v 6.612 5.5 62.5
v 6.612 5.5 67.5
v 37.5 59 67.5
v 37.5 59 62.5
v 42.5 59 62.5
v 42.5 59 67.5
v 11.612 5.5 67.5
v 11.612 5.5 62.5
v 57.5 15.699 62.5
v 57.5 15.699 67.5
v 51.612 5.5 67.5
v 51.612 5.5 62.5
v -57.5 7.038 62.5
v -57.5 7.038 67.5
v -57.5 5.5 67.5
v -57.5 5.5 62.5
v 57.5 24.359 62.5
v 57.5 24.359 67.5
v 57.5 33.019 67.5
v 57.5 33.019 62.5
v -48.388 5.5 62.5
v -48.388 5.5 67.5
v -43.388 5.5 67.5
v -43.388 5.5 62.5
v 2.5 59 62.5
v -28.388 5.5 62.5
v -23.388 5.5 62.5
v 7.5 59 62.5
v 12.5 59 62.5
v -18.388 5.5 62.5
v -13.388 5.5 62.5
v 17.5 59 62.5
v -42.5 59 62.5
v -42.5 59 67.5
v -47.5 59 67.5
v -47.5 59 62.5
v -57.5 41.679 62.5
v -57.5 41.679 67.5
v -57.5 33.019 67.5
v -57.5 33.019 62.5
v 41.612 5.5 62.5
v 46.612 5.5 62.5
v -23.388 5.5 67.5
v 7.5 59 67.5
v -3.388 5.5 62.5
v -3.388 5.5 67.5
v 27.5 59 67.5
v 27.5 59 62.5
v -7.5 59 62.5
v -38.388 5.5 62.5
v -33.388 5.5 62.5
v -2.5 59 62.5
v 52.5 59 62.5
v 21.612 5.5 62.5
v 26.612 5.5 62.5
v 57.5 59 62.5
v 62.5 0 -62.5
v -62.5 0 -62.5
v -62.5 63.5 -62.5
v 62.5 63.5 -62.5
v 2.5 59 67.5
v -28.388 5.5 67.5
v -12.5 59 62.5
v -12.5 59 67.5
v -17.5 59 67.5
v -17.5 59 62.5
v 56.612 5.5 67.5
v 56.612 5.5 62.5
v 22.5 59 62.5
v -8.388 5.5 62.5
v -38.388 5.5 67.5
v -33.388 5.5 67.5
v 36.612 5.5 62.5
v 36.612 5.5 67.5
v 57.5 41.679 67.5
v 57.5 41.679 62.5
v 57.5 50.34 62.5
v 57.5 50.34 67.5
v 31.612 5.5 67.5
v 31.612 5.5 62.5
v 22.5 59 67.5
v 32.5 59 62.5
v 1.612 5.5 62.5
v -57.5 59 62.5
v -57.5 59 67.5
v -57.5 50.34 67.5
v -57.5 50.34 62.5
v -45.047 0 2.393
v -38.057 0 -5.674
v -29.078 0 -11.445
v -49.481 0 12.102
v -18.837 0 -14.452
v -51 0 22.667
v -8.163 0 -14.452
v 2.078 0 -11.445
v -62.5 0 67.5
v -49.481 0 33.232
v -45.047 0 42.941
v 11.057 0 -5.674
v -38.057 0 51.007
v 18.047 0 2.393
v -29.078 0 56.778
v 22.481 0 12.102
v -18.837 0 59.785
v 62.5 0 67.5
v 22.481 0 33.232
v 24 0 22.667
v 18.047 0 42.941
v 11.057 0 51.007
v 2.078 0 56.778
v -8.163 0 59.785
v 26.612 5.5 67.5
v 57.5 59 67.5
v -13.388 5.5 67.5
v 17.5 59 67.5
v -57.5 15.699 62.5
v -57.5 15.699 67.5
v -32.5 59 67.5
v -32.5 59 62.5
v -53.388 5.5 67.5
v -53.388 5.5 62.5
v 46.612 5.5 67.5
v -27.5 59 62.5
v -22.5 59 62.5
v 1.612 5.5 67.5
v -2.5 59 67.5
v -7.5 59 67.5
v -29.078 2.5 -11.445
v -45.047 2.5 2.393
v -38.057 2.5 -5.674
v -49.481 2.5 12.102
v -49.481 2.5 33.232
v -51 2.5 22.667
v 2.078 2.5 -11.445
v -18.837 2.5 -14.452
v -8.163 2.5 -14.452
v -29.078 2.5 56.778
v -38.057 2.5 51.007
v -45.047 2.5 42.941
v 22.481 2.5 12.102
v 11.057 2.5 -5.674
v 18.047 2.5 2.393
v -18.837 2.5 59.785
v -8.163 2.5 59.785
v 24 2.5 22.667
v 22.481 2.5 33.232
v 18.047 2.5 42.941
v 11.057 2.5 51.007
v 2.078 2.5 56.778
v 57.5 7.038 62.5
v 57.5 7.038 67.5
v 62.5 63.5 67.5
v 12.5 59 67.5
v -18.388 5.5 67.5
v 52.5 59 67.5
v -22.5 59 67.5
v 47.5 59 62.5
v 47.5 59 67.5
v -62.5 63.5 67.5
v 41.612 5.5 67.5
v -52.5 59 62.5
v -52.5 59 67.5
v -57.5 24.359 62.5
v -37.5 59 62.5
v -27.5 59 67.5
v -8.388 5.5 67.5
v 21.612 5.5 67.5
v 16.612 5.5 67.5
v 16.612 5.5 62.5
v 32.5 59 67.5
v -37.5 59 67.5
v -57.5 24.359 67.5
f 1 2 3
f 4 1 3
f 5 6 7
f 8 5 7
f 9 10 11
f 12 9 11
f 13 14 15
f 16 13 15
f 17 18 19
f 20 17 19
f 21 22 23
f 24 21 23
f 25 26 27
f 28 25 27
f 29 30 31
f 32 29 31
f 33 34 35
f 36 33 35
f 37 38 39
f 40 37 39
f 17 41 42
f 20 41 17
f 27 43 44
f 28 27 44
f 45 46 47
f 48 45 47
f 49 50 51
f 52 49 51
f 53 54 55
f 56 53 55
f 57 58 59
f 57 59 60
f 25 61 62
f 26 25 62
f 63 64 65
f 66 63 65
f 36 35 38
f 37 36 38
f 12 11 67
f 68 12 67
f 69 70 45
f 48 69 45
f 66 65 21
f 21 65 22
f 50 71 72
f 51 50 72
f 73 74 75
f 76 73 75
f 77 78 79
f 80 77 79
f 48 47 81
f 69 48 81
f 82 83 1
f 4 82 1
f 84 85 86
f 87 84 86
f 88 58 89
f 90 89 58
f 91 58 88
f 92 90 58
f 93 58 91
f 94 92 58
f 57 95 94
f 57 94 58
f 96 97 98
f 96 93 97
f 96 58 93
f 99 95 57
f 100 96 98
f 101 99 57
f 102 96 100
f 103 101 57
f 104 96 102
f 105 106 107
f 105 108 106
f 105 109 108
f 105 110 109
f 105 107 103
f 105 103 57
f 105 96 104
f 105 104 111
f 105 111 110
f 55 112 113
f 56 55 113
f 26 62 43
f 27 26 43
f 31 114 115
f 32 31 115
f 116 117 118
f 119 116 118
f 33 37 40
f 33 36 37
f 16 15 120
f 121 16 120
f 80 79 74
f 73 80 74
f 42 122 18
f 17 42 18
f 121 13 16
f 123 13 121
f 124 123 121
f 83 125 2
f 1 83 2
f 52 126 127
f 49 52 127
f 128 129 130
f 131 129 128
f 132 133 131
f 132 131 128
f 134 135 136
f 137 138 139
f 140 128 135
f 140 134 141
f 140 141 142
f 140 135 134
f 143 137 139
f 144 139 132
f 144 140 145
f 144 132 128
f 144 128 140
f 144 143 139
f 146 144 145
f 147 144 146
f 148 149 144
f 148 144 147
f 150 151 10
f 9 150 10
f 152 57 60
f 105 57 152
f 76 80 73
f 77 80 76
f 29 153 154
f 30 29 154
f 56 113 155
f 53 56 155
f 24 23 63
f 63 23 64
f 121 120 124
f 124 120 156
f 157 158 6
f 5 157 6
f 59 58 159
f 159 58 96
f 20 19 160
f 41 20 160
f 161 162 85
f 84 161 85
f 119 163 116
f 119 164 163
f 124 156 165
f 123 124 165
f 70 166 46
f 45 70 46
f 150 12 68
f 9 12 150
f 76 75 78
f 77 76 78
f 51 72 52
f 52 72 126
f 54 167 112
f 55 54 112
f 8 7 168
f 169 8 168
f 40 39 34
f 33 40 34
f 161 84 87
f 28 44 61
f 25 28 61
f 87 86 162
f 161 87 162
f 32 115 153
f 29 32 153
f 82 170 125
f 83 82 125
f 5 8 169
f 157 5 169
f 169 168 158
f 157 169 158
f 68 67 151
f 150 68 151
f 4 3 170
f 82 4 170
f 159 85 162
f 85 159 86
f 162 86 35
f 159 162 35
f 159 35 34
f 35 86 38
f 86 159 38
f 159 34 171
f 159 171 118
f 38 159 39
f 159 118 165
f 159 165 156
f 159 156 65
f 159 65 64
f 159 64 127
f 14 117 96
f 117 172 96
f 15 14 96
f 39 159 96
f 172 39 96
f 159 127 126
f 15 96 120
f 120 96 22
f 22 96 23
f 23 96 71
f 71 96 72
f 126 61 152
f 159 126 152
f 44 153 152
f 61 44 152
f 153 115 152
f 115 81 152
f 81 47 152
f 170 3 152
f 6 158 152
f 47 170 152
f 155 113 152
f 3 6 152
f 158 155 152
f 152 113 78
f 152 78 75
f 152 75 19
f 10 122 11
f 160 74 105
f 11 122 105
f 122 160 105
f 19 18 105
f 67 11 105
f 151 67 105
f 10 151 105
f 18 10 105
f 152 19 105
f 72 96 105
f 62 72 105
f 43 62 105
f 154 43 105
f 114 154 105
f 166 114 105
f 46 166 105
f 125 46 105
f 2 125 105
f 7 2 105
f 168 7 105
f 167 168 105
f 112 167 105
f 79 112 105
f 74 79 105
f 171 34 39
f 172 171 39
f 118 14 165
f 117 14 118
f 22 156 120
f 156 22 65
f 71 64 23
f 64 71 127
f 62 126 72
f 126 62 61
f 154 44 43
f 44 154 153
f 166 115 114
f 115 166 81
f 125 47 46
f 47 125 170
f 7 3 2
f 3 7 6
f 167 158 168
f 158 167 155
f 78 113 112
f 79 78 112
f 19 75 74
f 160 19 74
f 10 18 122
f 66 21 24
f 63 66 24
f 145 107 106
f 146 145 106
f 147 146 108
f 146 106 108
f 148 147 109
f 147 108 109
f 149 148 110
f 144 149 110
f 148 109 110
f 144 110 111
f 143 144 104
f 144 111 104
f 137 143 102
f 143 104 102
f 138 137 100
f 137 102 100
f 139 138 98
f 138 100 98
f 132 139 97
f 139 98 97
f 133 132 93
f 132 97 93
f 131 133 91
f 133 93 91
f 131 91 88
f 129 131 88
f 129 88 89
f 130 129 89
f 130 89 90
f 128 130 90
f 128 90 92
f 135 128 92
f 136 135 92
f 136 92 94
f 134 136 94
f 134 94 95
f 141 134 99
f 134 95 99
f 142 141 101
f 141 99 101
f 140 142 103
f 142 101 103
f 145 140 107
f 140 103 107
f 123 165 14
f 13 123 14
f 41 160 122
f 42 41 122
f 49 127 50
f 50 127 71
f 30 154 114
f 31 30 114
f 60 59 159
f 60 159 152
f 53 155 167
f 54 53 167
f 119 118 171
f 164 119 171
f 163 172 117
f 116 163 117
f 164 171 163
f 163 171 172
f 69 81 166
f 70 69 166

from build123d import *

# Parameters (mm, degrees)
F0_W     = 125
F0_H     = 100
F2_DEPTH = 63.5
F0_H_2   = 30
F3_DEPTH = 63.5
F1_R     = 37.5
F4_DEPTH = 2.5
F6_DEPTH = 5


with BuildPart() as f2:
    # F0 (on Front) → F2 (new body)
    with BuildSketch(Plane.XZ):
        with Locations((0, 17.5)):
            Rectangle(F0_W, F0_H)
    extrude(amount=-F2_DEPTH)

    # F0 (on Front) → F3 (join)
    with BuildSketch(Plane.XZ):
        with Locations((0, -47.5)):
            Rectangle(F0_W, F0_H_2)
    extrude(amount=-F3_DEPTH)

    # F1 (on Front) → F4 (cut, symmetric)
    with BuildSketch(Plane.XZ):
        with Locations((-13.5, 22.6666666667)):
            Circle(F1_R)
    extrude(amount=F4_DEPTH, both=True, mode=Mode.SUBTRACT)

    # F5 (on face) → F6 (cut)
    with BuildSketch(Plane.XY.offset(67.5)):
        Polygon((-57.5, 59), (-57.5, 50.3397459622), (-52.5, 59), align=None)
        Polygon((-57.5, 41.6794919243), (-57.5, 33.0192378865), (-42.5, 59), (-47.5, 59), align=None)
        Polygon((-57.5, 24.3589838486), (-57.5, 15.6987298108), (-32.5, 59), (-37.5, 59), align=None)
        Polygon((-27.5, 59), (-57.5, 7.0384757729), (-57.5, 5.5), (-53.3882394016, 5.5), (-22.5, 59), align=None)
        Polygon((-17.5, 59), (-48.3882394016, 5.5), (-43.3882394016, 5.5), (-12.5, 59), align=None)
        Polygon((-7.5, 59), (-38.3882394016, 5.5), (-33.3882394016, 5.5), (-2.5, 59), align=None)
        Polygon((2.5, 59), (-28.3882394016, 5.5), (-23.3882394016, 5.5), (7.5, 59), align=None)
        Polygon((-18.3882394016, 5.5), (-13.3882394016, 5.5), (17.5, 59), (12.5, 59), align=None)
        Polygon((-8.3882394016, 5.5), (-3.3882394016, 5.5), (27.5, 59), (22.5, 59), align=None)
        Polygon((1.6117605984, 5.5), (6.6117605984, 5.5), (37.5, 59), (32.5, 59), align=None)
        Polygon((11.6117605984, 5.5), (16.6117605984, 5.5), (47.5, 59), (42.5, 59), align=None)
        Polygon((21.6117605984, 5.5), (26.6117605984, 5.5), (57.5, 59), (52.5, 59), align=None)
        Polygon((31.6117605984, 5.5), (36.6117605984, 5.5), (57.5, 41.6794919243), (57.5, 50.3397459622), align=None)
        Polygon((41.6117605984, 5.5), (46.6117605984, 5.5), (57.5, 24.3589838486), (57.5, 33.0192378865), align=None)
        Polygon((51.6117605984, 5.5), (56.6117605984, 5.5), (57.5, 7.0384757729), (57.5, 15.6987298108), align=None)
    extrude(amount=-F6_DEPTH, mode=Mode.SUBTRACT)


solid = f2.part
